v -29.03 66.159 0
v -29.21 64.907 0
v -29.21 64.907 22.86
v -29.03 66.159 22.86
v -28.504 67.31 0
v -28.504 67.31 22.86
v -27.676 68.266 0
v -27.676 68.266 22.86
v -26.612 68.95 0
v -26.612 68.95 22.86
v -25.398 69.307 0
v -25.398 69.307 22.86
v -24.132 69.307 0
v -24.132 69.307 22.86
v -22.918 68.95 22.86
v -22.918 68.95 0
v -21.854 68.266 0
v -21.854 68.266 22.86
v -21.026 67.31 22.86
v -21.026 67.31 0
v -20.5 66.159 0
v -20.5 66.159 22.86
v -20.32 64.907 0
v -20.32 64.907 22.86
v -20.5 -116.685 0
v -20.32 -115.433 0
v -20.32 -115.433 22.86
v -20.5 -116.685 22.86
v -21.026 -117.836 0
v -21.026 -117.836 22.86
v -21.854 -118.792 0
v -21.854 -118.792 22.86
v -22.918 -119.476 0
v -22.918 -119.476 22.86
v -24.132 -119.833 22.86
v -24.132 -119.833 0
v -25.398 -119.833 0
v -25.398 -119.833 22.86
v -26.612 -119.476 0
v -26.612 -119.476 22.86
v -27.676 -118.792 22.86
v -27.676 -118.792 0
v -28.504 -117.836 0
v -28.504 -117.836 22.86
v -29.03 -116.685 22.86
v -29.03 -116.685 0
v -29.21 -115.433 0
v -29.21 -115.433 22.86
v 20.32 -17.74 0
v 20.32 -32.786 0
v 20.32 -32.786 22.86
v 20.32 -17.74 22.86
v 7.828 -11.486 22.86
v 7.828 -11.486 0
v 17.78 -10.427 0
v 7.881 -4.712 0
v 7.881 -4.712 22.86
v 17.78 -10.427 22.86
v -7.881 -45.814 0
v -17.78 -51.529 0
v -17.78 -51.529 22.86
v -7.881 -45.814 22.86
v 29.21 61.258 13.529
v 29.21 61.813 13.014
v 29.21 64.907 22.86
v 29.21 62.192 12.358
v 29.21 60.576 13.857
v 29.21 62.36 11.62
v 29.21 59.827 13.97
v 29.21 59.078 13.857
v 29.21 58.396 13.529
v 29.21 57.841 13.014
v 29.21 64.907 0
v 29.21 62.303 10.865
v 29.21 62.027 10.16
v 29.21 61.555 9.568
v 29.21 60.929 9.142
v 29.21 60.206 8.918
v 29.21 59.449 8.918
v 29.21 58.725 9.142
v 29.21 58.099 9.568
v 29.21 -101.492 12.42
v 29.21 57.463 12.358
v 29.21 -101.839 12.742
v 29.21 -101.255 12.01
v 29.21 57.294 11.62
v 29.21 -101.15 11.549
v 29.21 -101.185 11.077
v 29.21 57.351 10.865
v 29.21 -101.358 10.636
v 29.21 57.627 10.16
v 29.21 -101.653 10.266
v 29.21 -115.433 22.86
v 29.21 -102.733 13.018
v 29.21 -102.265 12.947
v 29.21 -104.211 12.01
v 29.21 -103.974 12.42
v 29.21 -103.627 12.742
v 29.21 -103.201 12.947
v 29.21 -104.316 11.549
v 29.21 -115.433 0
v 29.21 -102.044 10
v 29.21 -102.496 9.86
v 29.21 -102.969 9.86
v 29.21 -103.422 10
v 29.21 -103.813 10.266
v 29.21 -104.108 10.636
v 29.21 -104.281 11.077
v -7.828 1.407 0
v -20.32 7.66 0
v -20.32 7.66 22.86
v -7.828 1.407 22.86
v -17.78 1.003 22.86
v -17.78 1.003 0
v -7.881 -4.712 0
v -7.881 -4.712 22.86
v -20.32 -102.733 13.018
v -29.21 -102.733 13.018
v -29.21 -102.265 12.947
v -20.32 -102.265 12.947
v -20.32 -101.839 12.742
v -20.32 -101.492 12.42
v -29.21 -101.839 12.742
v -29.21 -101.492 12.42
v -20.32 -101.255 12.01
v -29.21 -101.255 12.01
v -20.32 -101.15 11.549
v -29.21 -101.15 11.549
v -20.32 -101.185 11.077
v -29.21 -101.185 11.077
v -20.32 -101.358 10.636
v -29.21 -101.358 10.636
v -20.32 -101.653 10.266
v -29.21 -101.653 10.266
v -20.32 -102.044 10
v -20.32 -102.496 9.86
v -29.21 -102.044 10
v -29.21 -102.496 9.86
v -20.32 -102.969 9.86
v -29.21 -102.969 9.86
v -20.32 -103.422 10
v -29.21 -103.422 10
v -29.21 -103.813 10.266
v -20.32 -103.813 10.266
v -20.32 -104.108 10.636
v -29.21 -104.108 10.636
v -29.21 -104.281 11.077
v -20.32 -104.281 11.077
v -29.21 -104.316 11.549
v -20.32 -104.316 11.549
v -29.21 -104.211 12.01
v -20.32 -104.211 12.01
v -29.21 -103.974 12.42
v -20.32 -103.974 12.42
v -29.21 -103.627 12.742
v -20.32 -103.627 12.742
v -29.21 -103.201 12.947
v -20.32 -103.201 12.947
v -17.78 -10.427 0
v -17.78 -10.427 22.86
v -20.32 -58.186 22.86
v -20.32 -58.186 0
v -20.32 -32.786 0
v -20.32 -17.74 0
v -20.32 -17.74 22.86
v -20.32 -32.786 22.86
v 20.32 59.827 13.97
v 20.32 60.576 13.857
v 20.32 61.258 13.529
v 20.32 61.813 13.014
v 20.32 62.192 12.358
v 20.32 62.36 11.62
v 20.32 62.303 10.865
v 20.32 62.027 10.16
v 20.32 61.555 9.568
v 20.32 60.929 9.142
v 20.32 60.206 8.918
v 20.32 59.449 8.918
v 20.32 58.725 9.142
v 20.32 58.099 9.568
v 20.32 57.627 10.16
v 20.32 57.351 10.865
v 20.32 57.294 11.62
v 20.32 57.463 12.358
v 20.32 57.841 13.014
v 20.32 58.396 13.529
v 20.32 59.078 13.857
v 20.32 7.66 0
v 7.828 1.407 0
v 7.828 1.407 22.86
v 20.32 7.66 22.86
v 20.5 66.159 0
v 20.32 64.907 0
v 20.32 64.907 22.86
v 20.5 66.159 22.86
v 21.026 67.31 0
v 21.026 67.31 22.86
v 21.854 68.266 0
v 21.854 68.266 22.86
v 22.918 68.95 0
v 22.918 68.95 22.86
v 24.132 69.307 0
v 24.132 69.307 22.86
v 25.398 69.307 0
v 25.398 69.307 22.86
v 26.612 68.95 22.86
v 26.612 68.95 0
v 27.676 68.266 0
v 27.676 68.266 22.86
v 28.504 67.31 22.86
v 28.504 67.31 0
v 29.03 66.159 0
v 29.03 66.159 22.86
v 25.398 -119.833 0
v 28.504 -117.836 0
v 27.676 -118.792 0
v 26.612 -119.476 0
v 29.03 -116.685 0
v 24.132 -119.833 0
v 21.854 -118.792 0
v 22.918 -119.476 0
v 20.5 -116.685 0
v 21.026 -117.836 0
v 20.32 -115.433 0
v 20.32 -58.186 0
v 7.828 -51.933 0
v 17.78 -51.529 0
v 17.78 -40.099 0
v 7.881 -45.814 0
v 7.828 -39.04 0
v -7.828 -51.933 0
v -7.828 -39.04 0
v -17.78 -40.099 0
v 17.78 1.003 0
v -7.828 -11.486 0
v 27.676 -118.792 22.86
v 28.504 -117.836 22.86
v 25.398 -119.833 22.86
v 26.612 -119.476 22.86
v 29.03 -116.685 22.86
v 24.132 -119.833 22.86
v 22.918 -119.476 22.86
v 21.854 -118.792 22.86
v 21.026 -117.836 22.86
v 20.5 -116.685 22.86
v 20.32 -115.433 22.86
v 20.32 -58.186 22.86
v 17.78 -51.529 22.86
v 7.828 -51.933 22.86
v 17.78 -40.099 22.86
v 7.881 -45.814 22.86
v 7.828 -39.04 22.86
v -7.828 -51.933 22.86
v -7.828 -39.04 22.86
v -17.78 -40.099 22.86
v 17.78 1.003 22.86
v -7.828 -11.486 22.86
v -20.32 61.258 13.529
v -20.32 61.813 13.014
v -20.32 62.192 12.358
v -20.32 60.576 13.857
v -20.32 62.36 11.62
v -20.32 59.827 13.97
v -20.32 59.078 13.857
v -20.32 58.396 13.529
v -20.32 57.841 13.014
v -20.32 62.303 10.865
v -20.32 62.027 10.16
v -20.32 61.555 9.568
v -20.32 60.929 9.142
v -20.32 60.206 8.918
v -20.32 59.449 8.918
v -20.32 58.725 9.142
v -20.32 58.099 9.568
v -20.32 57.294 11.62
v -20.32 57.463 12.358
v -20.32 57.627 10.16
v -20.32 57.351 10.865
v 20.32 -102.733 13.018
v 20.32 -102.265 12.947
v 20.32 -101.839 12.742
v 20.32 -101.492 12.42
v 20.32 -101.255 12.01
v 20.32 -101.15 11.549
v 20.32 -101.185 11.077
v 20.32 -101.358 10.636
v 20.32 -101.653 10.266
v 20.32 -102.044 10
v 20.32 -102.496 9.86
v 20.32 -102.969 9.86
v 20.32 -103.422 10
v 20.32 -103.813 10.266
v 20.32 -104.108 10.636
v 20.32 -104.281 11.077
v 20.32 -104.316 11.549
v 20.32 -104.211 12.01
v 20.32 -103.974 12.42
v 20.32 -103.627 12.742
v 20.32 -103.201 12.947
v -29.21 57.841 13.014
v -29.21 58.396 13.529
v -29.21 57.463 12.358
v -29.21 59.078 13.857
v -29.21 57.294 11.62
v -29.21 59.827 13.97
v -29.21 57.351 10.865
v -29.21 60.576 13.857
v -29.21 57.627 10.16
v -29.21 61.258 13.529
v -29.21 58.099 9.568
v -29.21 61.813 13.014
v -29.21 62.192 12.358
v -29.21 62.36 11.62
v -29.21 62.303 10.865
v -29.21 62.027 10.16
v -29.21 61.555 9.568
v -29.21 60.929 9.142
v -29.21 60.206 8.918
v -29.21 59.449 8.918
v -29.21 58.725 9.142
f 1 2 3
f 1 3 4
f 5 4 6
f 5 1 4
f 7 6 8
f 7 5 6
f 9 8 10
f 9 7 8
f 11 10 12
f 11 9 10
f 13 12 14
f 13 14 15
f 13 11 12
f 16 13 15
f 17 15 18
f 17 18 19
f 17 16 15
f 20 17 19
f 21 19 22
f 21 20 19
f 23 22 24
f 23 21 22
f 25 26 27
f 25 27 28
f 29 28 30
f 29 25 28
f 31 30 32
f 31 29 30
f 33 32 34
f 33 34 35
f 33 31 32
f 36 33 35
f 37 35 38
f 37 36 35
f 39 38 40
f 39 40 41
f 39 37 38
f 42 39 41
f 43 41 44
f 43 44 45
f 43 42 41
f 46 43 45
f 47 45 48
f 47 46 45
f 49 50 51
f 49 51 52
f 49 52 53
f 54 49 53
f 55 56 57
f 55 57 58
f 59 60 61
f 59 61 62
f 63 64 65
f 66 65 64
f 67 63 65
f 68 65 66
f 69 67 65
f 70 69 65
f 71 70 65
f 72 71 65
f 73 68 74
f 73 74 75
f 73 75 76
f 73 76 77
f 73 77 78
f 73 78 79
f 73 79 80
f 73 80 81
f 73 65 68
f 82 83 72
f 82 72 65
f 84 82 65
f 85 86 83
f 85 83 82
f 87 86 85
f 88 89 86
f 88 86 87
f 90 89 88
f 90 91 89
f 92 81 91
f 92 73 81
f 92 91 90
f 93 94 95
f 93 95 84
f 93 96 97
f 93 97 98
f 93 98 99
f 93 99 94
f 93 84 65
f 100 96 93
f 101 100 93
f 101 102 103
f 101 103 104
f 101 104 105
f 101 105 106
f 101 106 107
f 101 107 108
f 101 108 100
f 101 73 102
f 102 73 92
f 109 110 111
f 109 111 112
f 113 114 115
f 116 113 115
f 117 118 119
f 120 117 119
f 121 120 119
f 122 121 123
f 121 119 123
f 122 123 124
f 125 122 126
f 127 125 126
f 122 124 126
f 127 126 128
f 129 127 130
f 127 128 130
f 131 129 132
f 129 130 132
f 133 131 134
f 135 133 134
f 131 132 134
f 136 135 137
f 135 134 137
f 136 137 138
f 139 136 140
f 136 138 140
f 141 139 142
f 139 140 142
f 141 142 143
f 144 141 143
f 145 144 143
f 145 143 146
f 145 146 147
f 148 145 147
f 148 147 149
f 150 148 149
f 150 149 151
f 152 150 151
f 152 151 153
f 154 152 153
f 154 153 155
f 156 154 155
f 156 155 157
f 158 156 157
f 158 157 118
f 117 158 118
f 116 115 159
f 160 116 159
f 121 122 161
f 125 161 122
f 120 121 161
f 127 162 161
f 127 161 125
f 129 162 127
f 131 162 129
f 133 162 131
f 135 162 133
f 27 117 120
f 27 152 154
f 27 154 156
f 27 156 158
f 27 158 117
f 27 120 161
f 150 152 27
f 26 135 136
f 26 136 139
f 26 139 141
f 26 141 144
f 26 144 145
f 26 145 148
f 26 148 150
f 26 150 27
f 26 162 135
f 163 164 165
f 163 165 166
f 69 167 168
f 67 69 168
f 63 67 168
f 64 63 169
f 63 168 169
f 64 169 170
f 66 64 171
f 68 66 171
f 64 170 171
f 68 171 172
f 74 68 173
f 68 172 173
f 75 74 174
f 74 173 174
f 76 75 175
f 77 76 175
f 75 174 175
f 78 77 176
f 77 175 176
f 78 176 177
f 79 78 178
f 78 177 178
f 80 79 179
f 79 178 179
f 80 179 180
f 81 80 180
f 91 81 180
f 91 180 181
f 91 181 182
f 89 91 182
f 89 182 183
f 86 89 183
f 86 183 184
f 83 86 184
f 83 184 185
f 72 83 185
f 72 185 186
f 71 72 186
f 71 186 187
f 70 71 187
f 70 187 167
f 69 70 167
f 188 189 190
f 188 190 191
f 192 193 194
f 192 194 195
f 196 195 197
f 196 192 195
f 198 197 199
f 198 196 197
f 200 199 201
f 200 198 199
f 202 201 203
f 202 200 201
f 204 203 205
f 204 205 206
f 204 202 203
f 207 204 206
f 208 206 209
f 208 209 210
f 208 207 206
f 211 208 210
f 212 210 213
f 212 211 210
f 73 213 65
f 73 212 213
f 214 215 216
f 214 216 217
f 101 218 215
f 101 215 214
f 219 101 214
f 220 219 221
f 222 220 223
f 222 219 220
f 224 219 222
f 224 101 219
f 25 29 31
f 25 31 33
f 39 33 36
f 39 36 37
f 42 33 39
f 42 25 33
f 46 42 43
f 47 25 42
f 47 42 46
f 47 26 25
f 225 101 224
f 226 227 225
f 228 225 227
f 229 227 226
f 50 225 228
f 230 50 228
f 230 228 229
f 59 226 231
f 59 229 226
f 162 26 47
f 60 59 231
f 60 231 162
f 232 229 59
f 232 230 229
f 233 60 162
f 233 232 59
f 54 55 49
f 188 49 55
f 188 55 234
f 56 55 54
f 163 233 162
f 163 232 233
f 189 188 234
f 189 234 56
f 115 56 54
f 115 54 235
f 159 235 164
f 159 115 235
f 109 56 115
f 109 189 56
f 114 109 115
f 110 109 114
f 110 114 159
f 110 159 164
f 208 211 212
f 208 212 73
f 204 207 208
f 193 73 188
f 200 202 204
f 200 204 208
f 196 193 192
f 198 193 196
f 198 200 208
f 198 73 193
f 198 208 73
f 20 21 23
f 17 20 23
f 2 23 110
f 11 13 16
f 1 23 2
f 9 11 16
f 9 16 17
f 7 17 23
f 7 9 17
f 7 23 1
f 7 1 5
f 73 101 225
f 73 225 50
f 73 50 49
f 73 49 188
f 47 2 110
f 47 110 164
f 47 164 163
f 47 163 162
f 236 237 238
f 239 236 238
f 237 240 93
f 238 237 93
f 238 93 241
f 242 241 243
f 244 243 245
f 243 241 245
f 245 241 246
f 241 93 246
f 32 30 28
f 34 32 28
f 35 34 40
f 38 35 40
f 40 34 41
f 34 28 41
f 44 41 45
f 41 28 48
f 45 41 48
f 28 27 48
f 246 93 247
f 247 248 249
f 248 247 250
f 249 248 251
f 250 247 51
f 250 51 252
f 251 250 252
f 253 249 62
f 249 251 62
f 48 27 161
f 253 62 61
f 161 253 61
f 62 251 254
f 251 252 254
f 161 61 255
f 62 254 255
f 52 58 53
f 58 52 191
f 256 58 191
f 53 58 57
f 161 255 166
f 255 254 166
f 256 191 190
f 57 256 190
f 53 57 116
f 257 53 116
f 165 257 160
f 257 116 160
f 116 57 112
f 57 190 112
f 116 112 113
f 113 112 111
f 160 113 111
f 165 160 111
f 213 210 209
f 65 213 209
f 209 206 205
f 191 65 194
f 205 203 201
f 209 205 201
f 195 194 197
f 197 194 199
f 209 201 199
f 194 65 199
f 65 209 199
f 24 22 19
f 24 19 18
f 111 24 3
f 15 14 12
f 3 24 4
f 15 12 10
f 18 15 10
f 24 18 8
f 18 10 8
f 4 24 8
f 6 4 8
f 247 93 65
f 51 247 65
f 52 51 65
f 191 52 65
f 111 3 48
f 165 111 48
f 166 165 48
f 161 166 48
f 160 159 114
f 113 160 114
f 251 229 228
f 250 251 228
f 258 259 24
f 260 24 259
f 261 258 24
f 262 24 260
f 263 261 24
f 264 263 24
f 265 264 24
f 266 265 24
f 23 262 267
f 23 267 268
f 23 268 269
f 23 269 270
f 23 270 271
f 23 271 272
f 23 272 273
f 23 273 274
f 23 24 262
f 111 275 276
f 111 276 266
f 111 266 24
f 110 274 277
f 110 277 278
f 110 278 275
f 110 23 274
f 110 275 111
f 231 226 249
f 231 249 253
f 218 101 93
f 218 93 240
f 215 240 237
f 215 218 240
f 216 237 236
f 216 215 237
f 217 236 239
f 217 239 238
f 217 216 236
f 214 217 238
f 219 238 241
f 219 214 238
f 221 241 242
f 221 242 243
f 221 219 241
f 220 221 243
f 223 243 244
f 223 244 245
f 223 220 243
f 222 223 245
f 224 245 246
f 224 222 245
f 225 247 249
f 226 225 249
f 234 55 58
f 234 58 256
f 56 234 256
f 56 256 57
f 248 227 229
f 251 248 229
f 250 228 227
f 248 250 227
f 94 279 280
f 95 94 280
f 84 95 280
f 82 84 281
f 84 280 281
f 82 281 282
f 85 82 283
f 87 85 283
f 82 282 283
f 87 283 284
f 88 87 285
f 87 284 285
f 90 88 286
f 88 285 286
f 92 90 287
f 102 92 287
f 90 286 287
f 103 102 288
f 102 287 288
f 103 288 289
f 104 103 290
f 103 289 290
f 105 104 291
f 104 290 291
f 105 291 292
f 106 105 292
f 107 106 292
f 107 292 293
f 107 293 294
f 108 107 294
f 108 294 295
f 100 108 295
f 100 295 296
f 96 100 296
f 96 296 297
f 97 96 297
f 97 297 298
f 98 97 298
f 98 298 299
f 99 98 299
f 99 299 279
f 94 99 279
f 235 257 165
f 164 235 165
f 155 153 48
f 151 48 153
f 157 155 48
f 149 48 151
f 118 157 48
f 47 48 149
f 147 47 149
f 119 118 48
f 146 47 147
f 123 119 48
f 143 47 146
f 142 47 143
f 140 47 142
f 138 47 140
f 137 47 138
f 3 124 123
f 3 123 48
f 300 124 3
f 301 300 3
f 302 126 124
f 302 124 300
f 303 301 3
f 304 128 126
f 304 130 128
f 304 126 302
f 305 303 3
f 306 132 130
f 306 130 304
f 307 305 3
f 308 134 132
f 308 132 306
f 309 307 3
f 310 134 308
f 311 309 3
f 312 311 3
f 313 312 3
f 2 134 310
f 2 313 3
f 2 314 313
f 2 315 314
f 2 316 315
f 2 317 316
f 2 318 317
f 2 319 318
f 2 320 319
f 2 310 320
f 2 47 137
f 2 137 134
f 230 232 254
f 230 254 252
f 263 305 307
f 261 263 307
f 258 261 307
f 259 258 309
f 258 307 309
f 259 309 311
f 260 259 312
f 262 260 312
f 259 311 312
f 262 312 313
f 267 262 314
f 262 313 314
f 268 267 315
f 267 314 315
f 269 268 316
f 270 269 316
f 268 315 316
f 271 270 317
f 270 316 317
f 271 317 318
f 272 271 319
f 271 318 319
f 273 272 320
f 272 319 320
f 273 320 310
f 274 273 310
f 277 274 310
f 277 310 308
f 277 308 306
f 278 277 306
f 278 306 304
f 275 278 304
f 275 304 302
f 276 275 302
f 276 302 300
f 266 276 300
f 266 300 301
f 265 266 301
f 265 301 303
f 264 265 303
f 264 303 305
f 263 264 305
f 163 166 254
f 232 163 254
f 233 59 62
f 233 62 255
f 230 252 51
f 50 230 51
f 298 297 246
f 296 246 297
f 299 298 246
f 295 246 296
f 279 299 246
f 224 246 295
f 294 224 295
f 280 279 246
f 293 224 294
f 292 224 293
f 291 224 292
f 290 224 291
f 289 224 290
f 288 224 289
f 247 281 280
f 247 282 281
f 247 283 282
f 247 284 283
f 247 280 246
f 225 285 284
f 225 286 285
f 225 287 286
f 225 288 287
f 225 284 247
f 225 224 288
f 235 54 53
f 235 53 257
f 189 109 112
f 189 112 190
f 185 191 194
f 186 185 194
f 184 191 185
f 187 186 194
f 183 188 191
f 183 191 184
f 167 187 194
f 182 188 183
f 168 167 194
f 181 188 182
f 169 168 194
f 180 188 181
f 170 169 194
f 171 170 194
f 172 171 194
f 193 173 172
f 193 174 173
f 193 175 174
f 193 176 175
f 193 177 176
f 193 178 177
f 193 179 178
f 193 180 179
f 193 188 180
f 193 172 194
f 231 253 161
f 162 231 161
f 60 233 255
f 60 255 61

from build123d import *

# Parameters (mm, degrees)
BOSS_EXTRUDE1_DEPTH = 22.86
SKETCH3_R           = 1.5875
CUT_EXTRUDE1_DEPTH  = 136.30034598
SKETCH4_R           = 2.54
CUT_EXTRUDE2_DEPTH  = 136.30034598


with BuildPart() as part:
    # Sketch2 → Boss-Extrude1 (new body)
    with BuildSketch(Plane.XY):
        with BuildLine():
            Line((-20.32, 64.907113706), (-20.32, 7.660427971))
            Line((-20.32, 7.660427971), (-7.827723958, 1.407113706))
            Line((-7.827723958, 1.407113706), (7.827723958, 1.407113706))
            Line((7.827723958, 1.407113706), (20.32, 7.660427971))
            Line((20.32, 7.660427971), (20.32, 64.907113706))
            ThreePointArc((20.32, 64.907113706), (24.765, 69.352113706), (29.21, 64.907113706))
            Line((29.21, 64.907113706), (29.21, -115.432886294))
            ThreePointArc((29.21, -115.432886294), (24.765, -119.877886294), (20.32, -115.432886294))
            Line((20.32, -115.432886294), (20.32, -58.186200558))
            Line((20.32, -58.186200558), (7.827723958, -51.932886294))
            Line((7.827723958, -51.932886294), (-7.827723958, -51.932886294))
            Line((-7.827723958, -51.932886294), (-20.32, -58.186200558))
            Line((-20.32, -58.186200558), (-20.32, -115.432886294))
            ThreePointArc((-20.32, -115.432886294), (-24.765, -119.877886294), (-29.21, -115.432886294))
            Line((-29.21, -115.432886294), (-29.21, 64.907113706))
            ThreePointArc((-29.21, 64.907113706), (-24.765, 69.352113706), (-20.32, 64.907113706))
        make_face()
        Polygon((-17.78, -40.099060348), (-17.78, -51.529060348), (-7.881329635, -45.814060348), align=None, mode=Mode.SUBTRACT)
        Polygon((-20.32, -32.786200558), (-7.827723958, -39.039514822), (7.827723958, -39.039514822), (20.32, -32.786200558), (20.32, -17.739572029), (7.827723958, -11.486257765), (-7.827723958, -11.486257765), (-20.32, -17.739572029), align=None, mode=Mode.SUBTRACT)
        Polygon((-17.78, 1.003287761), (-7.881329635, -4.711712239), (-17.78, -10.426712239), align=None, mode=Mode.SUBTRACT)
        Polygon((17.78, -51.529060348), (7.881329635, -45.814060348), (17.78, -40.099060348), align=None, mode=Mode.SUBTRACT)
        Polygon((17.78, -10.426712239), (17.78, 1.003287761), (7.881329635, -4.711712239), align=None, mode=Mode.SUBTRACT)
    extrude(amount=BOSS_EXTRUDE1_DEPTH)

    # Sketch3 → Cut-Extrude1 (cut, through all)
    with BuildSketch(Plane.ZY.offset(29.21)):
        with Locations((11.43, -102.732886294)):
            Circle(SKETCH3_R)
    extrude(amount=-CUT_EXTRUDE1_DEPTH, mode=Mode.SUBTRACT)

    # Sketch4 → Cut-Extrude2 (cut, through all)
    with BuildSketch(Plane.ZY.offset(29.21)):
        with Locations((11.43, 59.827113706)):
            Circle(SKETCH4_R)
    extrude(amount=-CUT_EXTRUDE2_DEPTH, mode=Mode.SUBTRACT)


solid = part.part
